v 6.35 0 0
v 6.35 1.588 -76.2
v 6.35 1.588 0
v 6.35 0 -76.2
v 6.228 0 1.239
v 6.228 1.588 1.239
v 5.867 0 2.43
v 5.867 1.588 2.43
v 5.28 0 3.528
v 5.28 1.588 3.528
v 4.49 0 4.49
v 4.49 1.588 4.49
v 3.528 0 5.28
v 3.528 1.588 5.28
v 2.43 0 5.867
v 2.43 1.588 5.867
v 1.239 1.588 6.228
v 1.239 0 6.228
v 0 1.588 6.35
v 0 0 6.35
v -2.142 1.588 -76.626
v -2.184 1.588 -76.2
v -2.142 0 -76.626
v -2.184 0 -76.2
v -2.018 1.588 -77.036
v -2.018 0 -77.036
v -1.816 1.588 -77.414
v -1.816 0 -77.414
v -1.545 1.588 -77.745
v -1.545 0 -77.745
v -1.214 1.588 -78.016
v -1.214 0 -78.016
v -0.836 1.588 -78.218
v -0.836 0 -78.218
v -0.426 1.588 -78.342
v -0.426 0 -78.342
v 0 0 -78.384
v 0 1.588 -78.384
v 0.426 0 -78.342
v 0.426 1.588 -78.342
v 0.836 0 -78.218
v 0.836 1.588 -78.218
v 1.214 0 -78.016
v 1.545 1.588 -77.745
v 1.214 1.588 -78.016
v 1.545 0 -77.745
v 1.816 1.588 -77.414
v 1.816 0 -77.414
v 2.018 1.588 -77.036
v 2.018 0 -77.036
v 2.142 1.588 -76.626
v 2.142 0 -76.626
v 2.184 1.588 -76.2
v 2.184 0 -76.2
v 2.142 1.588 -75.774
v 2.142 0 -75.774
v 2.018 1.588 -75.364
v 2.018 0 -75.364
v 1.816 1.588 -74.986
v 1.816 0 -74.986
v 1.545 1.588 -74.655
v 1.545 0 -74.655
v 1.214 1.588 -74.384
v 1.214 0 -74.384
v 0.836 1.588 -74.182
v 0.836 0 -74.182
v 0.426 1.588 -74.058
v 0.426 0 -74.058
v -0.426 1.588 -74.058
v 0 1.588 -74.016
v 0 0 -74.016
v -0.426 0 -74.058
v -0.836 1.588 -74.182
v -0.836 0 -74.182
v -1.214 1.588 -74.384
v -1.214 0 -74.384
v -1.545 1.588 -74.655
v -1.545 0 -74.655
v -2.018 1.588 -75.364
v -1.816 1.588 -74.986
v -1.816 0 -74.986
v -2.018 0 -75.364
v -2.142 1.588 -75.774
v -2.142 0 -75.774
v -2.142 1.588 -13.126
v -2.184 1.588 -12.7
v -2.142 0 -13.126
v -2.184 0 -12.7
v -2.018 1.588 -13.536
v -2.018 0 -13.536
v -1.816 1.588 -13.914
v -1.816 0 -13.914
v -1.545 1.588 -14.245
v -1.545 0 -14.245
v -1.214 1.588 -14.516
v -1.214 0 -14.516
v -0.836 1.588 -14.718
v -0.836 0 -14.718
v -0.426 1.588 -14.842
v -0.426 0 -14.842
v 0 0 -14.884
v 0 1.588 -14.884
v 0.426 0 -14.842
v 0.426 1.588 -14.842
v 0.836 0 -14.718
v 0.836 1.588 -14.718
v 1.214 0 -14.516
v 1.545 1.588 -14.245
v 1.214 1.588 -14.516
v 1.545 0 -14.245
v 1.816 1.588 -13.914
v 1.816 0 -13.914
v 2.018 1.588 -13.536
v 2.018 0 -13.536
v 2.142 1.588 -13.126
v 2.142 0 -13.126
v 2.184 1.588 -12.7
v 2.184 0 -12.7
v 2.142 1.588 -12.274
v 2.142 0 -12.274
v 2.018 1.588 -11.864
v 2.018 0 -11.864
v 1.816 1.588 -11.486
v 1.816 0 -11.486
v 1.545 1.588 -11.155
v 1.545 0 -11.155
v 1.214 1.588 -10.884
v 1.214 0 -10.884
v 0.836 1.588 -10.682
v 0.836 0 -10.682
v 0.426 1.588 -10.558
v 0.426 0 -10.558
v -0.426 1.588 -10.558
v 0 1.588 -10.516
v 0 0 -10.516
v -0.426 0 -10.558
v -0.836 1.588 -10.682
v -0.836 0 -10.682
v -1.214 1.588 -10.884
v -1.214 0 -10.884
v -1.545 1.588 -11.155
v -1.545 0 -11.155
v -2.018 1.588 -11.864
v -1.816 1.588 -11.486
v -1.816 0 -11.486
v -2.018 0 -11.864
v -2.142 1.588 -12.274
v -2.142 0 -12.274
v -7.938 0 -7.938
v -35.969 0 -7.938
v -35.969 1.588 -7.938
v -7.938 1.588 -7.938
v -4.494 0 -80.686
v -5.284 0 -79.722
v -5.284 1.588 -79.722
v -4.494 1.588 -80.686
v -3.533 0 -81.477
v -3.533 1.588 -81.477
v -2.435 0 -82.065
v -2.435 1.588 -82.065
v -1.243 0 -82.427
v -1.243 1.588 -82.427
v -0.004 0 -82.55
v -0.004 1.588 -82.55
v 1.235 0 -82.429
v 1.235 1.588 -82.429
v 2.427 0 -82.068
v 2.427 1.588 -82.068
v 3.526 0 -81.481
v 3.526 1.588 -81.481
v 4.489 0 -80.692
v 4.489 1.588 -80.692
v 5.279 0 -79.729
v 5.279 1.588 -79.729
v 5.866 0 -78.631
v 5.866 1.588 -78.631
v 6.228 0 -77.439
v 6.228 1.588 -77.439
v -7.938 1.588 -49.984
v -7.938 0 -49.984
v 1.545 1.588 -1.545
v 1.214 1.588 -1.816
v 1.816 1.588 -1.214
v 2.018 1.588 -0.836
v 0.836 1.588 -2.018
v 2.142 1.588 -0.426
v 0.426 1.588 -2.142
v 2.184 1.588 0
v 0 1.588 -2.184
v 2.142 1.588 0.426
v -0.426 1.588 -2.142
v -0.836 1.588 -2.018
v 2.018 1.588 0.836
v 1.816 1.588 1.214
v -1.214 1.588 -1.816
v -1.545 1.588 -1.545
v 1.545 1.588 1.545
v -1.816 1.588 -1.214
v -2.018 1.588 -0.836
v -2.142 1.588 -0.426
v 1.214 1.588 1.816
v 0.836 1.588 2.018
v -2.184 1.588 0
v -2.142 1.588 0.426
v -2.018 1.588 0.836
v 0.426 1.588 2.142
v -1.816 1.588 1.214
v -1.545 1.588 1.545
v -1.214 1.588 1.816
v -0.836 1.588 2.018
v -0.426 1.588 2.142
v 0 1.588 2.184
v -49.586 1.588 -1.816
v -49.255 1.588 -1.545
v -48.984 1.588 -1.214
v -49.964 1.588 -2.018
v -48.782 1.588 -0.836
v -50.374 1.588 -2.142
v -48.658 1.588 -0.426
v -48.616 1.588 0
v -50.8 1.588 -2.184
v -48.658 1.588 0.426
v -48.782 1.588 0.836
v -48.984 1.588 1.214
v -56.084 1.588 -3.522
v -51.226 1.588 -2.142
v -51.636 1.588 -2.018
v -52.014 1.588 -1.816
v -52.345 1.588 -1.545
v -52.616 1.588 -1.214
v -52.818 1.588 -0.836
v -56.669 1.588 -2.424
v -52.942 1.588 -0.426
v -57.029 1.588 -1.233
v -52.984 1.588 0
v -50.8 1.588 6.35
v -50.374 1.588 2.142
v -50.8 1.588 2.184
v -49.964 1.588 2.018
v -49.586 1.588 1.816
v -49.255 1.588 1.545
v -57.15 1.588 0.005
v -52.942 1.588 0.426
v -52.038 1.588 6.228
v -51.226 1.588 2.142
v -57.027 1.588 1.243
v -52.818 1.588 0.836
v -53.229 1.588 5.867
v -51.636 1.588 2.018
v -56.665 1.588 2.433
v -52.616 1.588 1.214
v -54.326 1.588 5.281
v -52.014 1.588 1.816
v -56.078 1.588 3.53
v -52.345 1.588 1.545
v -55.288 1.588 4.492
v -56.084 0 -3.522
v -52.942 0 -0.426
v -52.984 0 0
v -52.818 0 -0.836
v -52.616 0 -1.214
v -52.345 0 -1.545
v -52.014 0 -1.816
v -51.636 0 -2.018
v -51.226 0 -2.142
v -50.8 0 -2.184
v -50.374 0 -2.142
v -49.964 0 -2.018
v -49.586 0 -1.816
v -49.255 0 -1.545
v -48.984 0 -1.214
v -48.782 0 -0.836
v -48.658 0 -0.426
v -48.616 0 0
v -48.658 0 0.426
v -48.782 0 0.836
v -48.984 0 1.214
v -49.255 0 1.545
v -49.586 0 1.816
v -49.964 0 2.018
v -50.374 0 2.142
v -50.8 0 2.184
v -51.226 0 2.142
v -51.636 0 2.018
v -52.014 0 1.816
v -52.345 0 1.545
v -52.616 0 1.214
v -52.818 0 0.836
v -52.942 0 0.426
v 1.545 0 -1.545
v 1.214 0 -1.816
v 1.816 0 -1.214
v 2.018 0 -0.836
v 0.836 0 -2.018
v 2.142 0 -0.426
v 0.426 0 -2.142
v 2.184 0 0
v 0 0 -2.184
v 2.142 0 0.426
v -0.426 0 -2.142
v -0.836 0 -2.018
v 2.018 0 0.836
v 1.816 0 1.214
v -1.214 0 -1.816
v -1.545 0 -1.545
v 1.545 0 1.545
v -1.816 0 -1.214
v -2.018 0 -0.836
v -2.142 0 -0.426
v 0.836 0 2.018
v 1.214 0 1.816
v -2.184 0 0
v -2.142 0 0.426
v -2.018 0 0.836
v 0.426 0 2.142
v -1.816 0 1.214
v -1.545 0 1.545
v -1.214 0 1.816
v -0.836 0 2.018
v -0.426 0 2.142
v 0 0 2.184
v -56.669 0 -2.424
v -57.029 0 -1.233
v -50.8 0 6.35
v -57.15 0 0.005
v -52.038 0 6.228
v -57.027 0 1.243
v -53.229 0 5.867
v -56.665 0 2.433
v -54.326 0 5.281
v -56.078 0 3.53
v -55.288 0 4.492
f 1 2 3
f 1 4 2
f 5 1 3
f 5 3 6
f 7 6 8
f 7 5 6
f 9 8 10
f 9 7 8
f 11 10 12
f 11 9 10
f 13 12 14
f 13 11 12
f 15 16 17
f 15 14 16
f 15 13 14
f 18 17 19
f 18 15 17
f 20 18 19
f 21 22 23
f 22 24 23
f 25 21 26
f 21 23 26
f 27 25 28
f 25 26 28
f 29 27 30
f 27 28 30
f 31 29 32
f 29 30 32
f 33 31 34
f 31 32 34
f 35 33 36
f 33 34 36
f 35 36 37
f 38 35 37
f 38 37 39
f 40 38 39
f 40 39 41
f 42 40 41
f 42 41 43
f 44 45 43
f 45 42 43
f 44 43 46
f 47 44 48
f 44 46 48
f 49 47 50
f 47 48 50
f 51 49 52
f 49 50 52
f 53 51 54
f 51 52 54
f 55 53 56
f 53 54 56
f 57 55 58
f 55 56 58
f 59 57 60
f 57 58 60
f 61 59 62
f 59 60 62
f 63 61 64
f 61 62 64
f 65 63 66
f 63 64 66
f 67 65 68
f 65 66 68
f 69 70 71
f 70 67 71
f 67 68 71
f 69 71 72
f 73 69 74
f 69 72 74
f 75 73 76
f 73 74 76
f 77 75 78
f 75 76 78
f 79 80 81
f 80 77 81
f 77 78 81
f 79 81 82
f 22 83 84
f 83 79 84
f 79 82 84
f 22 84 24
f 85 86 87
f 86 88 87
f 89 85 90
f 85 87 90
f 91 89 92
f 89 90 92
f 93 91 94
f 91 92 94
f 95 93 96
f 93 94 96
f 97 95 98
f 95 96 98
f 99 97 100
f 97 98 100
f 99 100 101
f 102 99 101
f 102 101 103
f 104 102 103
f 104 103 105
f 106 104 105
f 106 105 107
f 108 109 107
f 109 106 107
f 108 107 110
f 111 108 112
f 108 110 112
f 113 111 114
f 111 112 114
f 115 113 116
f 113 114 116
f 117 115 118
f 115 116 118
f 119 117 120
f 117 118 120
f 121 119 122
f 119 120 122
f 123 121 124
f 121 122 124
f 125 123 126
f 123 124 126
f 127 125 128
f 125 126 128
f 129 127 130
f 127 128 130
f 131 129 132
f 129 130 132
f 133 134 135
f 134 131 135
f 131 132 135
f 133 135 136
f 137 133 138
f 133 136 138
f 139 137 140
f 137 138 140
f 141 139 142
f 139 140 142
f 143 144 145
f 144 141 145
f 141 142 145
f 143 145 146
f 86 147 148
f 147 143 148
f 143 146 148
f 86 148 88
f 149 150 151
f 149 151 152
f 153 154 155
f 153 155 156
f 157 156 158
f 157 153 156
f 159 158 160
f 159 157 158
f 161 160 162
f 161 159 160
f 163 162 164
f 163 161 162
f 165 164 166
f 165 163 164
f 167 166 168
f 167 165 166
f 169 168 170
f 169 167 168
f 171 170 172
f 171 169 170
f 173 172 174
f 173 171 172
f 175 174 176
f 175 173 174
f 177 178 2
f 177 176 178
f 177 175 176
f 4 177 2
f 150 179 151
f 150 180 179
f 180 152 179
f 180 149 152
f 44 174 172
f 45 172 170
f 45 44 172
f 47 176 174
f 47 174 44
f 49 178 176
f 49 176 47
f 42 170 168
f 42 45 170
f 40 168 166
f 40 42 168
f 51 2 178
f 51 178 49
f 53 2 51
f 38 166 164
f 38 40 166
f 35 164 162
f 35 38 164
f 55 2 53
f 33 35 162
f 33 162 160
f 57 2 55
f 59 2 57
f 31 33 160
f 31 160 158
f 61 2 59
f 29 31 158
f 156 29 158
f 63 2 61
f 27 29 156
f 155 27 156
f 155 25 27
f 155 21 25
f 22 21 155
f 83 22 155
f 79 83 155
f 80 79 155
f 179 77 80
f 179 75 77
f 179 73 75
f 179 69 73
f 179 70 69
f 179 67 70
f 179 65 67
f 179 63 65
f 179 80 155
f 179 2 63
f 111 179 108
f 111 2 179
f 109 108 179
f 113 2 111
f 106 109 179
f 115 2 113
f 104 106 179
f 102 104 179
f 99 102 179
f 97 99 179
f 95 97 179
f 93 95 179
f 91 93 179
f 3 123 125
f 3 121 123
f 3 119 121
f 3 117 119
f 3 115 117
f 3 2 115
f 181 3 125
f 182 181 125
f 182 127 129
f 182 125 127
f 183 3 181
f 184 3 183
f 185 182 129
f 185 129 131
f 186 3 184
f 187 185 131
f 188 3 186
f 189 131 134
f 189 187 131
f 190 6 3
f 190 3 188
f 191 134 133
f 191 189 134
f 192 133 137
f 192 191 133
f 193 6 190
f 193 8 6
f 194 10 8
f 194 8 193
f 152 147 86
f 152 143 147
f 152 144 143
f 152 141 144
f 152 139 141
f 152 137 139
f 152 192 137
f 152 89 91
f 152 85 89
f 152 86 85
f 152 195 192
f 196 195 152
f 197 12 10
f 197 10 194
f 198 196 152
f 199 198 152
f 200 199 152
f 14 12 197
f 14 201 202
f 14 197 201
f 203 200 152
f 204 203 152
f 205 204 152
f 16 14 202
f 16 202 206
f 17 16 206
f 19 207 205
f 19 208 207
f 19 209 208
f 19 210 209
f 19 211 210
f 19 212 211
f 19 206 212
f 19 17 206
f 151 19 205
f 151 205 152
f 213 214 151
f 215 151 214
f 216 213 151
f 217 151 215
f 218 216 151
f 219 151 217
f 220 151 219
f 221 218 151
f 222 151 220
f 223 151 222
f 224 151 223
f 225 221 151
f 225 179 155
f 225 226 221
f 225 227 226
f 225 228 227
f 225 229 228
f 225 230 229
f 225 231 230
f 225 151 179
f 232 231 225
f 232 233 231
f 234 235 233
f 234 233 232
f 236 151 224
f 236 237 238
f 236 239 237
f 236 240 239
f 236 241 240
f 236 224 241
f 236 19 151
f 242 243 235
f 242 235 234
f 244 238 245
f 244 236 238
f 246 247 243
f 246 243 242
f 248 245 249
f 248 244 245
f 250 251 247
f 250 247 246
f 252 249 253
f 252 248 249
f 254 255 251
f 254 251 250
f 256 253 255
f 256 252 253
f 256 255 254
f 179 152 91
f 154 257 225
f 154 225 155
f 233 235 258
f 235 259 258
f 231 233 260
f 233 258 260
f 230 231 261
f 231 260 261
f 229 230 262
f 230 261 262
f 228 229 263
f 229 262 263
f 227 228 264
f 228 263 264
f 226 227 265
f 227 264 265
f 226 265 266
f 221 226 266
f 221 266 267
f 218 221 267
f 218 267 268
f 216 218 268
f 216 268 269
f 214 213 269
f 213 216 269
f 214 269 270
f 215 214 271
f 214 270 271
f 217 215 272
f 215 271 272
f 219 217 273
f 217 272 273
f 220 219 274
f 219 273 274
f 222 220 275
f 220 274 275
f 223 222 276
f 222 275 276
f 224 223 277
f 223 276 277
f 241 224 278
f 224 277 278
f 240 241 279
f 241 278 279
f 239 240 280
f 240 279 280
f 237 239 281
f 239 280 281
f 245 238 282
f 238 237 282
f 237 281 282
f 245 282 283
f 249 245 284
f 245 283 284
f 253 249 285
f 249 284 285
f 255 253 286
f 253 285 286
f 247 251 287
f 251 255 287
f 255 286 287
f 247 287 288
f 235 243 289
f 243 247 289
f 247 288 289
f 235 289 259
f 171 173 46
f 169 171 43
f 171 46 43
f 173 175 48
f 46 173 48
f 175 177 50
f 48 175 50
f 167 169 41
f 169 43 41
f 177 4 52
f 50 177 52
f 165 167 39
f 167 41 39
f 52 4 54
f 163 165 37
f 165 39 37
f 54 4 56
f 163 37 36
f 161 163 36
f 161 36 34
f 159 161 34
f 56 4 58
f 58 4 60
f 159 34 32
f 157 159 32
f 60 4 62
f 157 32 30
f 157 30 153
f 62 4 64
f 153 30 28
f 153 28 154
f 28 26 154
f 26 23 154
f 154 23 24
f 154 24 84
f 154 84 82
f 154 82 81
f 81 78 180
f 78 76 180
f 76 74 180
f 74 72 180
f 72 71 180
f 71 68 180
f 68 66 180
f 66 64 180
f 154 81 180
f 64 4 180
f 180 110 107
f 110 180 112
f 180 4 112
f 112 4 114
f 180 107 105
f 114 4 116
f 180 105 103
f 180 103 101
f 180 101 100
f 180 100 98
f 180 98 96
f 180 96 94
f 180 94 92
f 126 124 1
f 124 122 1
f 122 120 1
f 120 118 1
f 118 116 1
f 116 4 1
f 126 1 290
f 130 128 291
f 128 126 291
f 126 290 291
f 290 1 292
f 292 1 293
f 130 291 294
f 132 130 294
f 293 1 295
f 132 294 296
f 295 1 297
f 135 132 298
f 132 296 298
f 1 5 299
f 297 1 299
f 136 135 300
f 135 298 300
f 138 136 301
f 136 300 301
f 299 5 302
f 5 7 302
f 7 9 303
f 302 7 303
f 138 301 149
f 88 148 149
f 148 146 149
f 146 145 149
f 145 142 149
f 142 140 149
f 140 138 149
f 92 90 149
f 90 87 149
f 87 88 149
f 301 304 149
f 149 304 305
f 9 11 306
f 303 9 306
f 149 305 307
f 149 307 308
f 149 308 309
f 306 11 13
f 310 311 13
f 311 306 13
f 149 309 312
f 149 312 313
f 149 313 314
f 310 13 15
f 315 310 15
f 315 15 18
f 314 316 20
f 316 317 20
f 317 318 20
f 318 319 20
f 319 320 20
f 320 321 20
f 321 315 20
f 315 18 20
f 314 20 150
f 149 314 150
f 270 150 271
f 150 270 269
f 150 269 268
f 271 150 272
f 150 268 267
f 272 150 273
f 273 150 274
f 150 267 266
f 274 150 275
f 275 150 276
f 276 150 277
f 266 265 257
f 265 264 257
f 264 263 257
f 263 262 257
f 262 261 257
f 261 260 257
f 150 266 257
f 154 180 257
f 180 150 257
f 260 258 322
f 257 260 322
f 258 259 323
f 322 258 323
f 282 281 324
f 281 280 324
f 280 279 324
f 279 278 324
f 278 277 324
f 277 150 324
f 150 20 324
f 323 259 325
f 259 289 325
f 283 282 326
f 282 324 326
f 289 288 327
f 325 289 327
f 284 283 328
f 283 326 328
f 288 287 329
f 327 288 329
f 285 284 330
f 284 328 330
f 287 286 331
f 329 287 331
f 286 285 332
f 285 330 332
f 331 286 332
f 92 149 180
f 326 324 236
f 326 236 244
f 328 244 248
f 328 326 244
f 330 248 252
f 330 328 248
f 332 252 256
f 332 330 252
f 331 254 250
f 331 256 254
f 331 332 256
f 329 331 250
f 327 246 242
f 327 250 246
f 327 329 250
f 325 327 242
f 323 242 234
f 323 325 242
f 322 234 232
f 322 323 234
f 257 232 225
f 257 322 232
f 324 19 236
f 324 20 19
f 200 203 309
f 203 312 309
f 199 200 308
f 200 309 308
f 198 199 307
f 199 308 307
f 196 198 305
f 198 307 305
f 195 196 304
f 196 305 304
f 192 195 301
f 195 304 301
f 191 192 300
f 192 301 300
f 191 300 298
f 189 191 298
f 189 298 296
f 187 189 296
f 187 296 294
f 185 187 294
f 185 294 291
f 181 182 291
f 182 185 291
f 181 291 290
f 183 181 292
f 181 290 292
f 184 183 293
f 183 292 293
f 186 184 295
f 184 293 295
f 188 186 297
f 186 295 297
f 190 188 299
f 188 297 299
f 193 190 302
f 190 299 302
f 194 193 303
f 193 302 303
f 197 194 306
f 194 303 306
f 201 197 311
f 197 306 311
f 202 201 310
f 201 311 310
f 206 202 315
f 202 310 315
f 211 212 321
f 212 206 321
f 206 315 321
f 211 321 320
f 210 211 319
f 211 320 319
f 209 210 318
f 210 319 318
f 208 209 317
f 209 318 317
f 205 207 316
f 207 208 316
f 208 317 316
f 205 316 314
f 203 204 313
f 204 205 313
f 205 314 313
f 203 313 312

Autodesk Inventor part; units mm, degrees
ref_plane "YZ Plane" through (0, 0, 0) normal (1, 0, 0) x (0, 1, 0)
ref_plane "XZ Plane" through (0, 0, 0) normal (0, 1, 0) x (-1, 0, 0)
ref_plane "XY Plane" through (0, 0, 0) normal (0, 0, 1) x (1, 0, 0)
sketch "main" plane through (0, 0, 0) normal (0, 0, 1) x (1, 0, 0)
  circle A0 centre (-24.2926, 27.4457) radius 2.1844
  circle A1 centre (-24.2926, -48.7543) radius 2.1844
  circle A2 centre (26.5074, 27.4457) radius 2.1844
  arc A3 (-30.6426, -48.7543) -> (-19.0091, -52.2766) centre (-24.2926, -48.7543) ccw
  arc A4 (31.7909, 23.9234) -> (26.5074, 33.7957) centre (26.5074, 27.4457) ccw
  arc A5 (-24.2926, 33.7957) -> (-30.6426, 27.4457) centre (-24.2926, 27.4457) ccw
  line L0 (-30.6426, -48.7543) -> (-30.6426, 27.4457)
  line L1 (-24.2926, 33.7957) -> (26.5074, 33.7957)
  line L2 (31.7909, 23.9234) -> (-19.0091, -52.2766)
  line L3 (-16.3551, -22.5385) -> (11.6761, 19.5082)
  line L4 (11.6761, 19.5082) -> (-16.3551, 19.5082)
  line L5 (-16.3551, 19.5082) -> (-16.3551, -22.5385)
  circle A6 centre (-24.2926, 14.7457) radius 2.1844
  point P0 (-7.9432, 11.0963)
  dimension "d0" = 12.7
  dimension "d1" = 12.7
  dimension "d2" = 12.7
  dimension "d3" = 14.2875
  dimension "d6" = 4.3688
  dimension "d7" = 76.2
  dimension "d8" = 0
sketch "Sketch1" plane through (0, 0, 0) normal (0, 1, 0) x (-1, 0, 0)
  circle A0 centre (0, 0) radius 2.1844
  circle A1 centre (0, -76.2) radius 2.1844
  circle A2 centre (50.8, 0) radius 2.1844
  arc A3 (-6.35, -76.2) -> (5.2835, -79.7223) centre (0, -76.2) ccw
  arc A4 (56.0835, -3.5223) -> (50.8, 6.35) centre (50.8, 0) ccw
  arc A5 (0, 6.35) -> (-6.35, 0) centre (0, 0) ccw
  line L0 (-6.35, -76.2) -> (-6.35, 0)
  line L1 (0, 6.35) -> (50.8, 6.35)
  line L2 (56.0835, -3.5223) -> (5.2835, -79.7223)
  line L3 (7.9375, -49.9842) -> (35.9686, -7.9375)
  line L4 (35.9686, -7.9375) -> (7.9375, -7.9375)
  line L5 (7.9375, -7.9375) -> (7.9375, -49.9842)
  circle A6 centre (0, -12.7) radius 2.1844
extrude "Extrusion1" add sketch "Sketch1" along normal blind 1.5875
properties part number "Triangle Gusset" material "Acetal Resin, White"
